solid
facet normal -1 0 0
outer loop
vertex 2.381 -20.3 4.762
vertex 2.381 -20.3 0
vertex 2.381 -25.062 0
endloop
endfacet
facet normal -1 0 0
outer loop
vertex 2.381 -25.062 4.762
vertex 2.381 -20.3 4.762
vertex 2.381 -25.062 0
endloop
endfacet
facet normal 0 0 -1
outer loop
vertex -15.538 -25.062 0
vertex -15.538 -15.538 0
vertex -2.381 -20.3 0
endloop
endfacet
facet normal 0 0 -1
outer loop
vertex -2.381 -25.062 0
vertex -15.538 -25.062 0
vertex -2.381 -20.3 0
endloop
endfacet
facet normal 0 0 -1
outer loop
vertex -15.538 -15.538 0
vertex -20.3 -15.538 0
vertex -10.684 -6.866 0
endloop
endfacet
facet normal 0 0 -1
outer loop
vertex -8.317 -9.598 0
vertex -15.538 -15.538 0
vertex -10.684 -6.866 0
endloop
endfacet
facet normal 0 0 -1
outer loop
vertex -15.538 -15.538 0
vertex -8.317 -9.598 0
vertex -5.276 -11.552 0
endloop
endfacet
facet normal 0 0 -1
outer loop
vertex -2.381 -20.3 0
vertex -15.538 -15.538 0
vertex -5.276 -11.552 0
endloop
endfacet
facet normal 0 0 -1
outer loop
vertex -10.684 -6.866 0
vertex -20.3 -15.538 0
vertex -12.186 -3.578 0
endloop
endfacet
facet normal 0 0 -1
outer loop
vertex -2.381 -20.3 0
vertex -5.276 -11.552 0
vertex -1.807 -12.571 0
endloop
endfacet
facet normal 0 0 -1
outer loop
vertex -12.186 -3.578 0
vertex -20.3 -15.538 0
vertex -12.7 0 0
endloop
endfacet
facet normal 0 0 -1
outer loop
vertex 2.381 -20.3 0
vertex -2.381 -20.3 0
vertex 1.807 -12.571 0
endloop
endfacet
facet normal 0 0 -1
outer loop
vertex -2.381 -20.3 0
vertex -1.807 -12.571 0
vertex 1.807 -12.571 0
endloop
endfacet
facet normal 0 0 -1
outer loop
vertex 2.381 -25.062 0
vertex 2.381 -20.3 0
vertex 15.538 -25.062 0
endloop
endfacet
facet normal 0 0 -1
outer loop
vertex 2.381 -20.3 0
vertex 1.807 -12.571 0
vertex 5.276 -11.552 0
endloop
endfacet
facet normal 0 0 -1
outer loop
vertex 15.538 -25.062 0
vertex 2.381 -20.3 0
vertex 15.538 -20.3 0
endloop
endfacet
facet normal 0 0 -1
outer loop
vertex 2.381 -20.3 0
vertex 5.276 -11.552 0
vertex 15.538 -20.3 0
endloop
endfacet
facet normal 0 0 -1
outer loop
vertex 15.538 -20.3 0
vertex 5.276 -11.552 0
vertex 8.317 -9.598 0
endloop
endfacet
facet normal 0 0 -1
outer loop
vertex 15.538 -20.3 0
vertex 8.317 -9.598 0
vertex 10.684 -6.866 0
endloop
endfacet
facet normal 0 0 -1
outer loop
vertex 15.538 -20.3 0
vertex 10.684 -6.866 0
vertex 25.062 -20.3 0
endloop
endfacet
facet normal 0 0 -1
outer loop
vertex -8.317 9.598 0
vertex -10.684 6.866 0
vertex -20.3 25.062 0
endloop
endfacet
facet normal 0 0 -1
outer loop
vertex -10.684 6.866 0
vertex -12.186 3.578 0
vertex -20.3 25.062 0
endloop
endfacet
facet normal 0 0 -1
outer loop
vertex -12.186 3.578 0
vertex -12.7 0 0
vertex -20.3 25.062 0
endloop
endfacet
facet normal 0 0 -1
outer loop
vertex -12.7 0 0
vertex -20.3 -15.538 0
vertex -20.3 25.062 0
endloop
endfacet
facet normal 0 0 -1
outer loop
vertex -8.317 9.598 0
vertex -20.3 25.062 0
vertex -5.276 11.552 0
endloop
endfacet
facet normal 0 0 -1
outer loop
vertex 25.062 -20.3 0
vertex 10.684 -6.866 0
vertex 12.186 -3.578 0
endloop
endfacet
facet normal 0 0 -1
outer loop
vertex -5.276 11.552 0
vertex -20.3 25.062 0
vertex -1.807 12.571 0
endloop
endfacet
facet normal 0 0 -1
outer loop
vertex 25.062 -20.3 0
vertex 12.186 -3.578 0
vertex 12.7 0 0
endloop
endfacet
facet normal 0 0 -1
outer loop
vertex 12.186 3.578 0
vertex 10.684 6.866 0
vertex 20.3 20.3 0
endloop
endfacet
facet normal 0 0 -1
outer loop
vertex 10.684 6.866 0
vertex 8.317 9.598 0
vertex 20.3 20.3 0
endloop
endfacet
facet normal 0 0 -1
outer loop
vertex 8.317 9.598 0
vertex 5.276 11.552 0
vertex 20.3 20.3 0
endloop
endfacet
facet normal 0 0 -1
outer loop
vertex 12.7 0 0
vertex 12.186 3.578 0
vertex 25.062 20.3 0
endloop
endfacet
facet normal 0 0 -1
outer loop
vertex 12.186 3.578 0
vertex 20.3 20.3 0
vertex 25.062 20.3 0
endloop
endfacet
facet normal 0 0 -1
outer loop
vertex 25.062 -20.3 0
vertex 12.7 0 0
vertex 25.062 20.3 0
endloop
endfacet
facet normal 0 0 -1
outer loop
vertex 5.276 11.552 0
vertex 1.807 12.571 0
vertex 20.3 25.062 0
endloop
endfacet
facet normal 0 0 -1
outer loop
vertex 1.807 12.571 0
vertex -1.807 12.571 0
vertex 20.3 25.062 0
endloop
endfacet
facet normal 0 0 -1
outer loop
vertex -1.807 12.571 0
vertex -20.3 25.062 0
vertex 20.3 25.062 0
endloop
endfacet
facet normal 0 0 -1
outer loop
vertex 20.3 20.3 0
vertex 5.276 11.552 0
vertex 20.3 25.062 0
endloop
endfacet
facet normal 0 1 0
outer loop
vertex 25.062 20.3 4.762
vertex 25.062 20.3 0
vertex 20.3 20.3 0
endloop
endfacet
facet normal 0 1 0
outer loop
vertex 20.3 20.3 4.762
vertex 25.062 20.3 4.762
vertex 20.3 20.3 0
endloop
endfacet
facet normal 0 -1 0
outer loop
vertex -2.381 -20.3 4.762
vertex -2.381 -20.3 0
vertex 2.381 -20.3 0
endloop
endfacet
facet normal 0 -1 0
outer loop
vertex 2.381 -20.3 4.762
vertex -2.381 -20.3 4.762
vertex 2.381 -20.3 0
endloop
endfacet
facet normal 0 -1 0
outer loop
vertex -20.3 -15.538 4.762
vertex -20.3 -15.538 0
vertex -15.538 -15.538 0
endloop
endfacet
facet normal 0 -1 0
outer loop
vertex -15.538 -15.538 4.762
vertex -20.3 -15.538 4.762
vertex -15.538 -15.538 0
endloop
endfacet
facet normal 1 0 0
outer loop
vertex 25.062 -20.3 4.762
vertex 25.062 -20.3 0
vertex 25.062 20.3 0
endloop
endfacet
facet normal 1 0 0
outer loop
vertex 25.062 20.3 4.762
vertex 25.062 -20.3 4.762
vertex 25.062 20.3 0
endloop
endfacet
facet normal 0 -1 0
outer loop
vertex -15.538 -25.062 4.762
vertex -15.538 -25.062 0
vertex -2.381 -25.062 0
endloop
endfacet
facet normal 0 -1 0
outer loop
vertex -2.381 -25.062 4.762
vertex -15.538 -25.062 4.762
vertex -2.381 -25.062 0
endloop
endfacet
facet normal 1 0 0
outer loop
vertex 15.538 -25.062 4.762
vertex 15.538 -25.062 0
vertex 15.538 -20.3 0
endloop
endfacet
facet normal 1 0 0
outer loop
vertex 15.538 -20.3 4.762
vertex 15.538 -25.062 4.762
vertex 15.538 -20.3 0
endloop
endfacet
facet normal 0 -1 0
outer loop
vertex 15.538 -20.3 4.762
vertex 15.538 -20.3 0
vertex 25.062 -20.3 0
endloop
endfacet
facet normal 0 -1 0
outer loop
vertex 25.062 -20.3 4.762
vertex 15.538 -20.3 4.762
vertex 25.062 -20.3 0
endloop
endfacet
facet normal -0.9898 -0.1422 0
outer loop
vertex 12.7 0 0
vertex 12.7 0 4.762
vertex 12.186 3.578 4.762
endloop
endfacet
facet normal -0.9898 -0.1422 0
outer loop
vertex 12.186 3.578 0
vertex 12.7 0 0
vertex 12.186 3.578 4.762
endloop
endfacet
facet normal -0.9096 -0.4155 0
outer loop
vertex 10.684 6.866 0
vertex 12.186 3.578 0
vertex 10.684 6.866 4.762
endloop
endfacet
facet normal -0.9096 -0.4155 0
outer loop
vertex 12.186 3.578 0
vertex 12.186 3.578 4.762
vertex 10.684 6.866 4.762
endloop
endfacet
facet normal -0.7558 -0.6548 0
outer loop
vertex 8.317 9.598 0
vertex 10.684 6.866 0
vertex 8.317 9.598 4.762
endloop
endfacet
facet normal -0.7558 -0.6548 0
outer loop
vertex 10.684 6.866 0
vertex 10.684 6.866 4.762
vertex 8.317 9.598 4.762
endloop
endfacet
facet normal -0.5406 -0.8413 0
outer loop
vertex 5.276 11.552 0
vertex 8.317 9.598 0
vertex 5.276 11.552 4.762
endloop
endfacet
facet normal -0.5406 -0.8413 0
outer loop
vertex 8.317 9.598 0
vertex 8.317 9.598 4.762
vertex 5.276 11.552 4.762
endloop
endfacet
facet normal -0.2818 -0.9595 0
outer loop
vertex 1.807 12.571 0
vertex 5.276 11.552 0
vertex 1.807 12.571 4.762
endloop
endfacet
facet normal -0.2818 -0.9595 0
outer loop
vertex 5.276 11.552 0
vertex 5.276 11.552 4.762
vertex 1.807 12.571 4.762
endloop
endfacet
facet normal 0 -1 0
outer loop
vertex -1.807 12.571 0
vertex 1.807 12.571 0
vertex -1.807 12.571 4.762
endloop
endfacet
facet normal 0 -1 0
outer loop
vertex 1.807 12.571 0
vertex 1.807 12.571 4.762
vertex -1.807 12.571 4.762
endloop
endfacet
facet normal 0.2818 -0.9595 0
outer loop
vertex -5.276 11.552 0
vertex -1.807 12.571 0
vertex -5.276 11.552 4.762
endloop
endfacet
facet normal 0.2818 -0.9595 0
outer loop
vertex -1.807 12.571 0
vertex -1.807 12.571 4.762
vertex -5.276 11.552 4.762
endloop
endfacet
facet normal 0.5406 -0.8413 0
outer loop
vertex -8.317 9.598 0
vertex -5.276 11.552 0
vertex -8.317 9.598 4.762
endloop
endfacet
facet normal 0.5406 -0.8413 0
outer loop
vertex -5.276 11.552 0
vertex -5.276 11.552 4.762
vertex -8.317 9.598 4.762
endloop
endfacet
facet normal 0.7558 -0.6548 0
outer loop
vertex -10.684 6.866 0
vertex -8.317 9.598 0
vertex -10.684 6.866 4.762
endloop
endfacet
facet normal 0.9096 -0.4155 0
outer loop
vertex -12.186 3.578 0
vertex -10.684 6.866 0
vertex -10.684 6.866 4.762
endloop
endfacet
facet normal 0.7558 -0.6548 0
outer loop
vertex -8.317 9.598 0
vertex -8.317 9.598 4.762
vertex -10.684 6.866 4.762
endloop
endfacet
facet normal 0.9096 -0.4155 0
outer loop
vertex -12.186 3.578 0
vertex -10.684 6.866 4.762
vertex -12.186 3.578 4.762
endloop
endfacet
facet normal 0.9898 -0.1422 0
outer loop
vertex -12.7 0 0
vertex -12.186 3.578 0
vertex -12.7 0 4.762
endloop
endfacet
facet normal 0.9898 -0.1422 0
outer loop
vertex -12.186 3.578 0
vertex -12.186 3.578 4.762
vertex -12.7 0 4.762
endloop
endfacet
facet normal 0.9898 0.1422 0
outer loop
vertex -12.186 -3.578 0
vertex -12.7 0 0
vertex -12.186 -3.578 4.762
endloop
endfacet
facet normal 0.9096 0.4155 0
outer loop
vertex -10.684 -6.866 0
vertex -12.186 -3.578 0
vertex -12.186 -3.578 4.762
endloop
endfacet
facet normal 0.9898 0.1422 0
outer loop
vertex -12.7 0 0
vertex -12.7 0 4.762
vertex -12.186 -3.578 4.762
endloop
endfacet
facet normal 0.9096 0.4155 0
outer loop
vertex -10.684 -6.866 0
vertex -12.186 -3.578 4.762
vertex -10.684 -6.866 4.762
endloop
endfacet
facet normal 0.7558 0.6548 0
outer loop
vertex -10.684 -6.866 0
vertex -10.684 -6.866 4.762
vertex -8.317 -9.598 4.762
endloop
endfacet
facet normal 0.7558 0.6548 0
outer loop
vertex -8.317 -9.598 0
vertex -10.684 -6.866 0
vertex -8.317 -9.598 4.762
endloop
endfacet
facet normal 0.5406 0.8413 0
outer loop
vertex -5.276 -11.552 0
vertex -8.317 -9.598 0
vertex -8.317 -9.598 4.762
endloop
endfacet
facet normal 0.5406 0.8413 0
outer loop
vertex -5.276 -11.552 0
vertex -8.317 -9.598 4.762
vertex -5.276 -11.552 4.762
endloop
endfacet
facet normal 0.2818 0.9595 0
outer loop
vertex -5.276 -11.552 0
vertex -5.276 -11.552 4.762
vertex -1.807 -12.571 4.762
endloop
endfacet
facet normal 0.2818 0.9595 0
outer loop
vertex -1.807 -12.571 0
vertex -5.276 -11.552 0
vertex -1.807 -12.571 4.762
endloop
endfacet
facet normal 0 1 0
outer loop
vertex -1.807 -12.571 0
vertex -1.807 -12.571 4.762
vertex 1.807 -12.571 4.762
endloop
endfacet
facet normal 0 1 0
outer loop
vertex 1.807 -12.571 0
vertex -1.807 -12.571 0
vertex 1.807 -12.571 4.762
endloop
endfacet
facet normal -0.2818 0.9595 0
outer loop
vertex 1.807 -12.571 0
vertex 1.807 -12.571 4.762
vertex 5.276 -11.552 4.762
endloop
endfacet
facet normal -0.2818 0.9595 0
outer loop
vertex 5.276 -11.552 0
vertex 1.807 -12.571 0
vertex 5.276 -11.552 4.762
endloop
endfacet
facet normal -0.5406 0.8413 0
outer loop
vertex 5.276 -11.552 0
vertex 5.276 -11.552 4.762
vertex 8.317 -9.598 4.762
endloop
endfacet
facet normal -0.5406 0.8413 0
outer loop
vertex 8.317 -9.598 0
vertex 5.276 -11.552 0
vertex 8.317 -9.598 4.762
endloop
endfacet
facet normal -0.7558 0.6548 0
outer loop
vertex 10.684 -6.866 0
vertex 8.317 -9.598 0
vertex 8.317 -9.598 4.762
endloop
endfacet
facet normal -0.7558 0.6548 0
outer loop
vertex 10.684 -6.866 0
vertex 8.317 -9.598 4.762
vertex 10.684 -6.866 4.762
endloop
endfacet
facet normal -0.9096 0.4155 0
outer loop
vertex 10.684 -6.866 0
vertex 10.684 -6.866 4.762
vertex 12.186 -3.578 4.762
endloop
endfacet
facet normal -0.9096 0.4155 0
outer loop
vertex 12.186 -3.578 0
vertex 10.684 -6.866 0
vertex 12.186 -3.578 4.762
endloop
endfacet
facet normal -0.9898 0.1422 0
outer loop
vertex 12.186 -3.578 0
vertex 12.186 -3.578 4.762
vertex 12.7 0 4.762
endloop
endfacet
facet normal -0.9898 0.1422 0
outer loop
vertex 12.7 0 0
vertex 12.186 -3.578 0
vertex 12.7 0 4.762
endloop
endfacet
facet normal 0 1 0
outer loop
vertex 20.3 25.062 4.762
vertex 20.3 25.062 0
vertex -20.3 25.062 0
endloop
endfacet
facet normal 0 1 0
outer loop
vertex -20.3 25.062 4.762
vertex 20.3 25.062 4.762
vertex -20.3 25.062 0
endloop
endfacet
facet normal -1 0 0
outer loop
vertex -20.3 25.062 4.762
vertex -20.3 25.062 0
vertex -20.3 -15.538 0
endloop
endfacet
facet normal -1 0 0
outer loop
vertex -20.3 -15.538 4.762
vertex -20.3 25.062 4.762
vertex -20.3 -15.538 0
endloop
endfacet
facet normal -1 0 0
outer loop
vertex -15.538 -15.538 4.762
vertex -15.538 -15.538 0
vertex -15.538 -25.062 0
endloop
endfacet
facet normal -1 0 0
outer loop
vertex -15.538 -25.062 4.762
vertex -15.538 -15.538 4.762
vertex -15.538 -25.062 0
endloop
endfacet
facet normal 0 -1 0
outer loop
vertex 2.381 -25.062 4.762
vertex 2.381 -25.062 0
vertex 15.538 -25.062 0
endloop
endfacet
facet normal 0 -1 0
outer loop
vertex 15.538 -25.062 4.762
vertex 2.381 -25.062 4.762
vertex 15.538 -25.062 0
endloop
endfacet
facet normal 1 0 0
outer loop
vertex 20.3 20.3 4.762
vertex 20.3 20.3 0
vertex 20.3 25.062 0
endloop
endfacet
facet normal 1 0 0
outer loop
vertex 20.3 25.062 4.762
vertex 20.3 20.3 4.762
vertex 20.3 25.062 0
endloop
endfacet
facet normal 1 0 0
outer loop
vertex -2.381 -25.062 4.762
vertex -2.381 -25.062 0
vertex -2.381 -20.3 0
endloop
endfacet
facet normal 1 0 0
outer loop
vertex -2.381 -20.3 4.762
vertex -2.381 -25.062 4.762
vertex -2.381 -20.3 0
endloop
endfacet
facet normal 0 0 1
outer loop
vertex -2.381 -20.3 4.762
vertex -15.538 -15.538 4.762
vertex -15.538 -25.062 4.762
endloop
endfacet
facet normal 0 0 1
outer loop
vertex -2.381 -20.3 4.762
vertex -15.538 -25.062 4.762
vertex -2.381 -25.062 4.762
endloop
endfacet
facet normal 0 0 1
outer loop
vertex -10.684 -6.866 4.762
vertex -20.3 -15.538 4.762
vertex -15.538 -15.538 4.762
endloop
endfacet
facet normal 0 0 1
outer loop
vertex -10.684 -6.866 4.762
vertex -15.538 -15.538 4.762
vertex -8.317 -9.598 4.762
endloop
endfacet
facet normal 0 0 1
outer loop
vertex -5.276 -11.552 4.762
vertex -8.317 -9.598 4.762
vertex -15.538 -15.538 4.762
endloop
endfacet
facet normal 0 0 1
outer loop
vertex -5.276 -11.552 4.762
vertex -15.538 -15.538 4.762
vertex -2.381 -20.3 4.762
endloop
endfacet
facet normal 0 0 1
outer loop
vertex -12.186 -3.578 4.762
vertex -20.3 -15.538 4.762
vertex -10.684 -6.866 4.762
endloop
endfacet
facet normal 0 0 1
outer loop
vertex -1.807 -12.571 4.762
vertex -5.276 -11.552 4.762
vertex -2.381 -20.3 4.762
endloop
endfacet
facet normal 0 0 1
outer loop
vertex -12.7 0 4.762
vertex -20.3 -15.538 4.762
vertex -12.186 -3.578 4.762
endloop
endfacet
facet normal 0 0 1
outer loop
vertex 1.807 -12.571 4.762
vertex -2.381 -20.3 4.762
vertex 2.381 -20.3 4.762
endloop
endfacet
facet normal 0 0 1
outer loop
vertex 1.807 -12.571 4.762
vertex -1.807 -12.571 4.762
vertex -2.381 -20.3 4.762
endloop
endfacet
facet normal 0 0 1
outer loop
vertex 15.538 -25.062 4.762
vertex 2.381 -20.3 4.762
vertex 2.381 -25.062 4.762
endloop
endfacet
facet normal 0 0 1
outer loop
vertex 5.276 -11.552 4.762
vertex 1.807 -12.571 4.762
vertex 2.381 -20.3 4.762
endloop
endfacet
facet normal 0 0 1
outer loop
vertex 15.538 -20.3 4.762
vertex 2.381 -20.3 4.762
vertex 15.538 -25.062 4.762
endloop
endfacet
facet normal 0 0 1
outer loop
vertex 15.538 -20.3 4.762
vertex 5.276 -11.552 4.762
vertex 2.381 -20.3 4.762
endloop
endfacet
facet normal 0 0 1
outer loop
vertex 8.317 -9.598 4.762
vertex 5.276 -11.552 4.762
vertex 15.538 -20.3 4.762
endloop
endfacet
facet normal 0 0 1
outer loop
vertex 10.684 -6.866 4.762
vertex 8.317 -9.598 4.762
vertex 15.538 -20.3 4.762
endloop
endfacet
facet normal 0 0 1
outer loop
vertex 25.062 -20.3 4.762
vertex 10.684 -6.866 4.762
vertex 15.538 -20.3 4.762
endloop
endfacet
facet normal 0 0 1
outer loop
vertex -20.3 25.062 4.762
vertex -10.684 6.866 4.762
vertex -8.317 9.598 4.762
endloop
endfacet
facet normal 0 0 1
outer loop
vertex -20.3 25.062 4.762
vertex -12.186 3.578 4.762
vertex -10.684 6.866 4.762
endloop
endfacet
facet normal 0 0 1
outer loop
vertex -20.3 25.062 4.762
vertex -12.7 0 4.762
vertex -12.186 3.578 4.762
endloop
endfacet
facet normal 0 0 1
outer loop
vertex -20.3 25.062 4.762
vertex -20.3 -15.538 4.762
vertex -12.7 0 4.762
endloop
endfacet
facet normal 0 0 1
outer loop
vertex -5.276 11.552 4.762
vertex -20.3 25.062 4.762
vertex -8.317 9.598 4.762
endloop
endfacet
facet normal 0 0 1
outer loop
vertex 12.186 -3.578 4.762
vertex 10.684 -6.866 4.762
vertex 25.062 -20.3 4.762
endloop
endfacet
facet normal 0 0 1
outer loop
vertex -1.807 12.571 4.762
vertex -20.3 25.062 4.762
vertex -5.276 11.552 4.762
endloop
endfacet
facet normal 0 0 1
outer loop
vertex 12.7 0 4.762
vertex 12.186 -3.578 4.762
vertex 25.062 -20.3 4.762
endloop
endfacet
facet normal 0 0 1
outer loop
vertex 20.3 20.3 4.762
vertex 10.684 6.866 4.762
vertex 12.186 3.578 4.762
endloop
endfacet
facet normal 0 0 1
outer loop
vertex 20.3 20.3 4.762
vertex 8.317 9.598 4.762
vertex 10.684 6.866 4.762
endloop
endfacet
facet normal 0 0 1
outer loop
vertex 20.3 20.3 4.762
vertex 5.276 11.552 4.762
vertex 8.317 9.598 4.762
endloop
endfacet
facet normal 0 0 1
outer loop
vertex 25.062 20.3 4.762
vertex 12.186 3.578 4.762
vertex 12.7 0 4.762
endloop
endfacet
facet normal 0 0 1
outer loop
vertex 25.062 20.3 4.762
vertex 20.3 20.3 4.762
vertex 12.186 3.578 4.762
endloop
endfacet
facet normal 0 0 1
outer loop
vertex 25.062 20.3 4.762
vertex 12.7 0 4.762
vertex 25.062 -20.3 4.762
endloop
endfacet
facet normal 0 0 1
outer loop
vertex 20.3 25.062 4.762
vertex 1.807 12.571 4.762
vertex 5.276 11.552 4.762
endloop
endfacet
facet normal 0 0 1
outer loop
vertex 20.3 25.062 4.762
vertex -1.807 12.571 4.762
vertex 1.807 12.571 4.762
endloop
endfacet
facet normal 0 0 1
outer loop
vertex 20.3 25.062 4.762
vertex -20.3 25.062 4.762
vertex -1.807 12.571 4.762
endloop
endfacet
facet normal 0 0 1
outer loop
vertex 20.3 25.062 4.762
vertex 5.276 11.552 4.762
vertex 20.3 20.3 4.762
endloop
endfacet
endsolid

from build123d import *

# Parameters (mm, degrees)
BOSS_EXTRUDE1_DEPTH = 4.7625
SKETCH2_R           = 12.7
CUT_EXTRUDE1_DEPTH  = 36.762259699


with BuildPart() as part:
    # Sketch1 → Boss-Extrude1 (new body)
    with BuildSketch(Plane.XY):
        Polygon((2.38125, -25.0625), (15.5375, -25.0625), (15.5375, -20.3), (25.0625, -20.3), (25.0625, 20.3), (20.3, 20.3), (20.3, 25.0625), (-20.3, 25.0625), (-20.3, -15.5375), (-15.5375, -15.5375), (-15.5375, -25.0625), (-2.38125, -25.0625), (-2.38125, -20.3), (2.38125, -20.3), align=None)
    extrude(amount=BOSS_EXTRUDE1_DEPTH)

    # Sketch2 → Cut-Extrude1 (cut, through all)
    with BuildSketch(Plane.XY.offset(4.7625)):
        Circle(SKETCH2_R)
    extrude(amount=-CUT_EXTRUDE1_DEPTH, mode=Mode.SUBTRACT)


solid = part.part
